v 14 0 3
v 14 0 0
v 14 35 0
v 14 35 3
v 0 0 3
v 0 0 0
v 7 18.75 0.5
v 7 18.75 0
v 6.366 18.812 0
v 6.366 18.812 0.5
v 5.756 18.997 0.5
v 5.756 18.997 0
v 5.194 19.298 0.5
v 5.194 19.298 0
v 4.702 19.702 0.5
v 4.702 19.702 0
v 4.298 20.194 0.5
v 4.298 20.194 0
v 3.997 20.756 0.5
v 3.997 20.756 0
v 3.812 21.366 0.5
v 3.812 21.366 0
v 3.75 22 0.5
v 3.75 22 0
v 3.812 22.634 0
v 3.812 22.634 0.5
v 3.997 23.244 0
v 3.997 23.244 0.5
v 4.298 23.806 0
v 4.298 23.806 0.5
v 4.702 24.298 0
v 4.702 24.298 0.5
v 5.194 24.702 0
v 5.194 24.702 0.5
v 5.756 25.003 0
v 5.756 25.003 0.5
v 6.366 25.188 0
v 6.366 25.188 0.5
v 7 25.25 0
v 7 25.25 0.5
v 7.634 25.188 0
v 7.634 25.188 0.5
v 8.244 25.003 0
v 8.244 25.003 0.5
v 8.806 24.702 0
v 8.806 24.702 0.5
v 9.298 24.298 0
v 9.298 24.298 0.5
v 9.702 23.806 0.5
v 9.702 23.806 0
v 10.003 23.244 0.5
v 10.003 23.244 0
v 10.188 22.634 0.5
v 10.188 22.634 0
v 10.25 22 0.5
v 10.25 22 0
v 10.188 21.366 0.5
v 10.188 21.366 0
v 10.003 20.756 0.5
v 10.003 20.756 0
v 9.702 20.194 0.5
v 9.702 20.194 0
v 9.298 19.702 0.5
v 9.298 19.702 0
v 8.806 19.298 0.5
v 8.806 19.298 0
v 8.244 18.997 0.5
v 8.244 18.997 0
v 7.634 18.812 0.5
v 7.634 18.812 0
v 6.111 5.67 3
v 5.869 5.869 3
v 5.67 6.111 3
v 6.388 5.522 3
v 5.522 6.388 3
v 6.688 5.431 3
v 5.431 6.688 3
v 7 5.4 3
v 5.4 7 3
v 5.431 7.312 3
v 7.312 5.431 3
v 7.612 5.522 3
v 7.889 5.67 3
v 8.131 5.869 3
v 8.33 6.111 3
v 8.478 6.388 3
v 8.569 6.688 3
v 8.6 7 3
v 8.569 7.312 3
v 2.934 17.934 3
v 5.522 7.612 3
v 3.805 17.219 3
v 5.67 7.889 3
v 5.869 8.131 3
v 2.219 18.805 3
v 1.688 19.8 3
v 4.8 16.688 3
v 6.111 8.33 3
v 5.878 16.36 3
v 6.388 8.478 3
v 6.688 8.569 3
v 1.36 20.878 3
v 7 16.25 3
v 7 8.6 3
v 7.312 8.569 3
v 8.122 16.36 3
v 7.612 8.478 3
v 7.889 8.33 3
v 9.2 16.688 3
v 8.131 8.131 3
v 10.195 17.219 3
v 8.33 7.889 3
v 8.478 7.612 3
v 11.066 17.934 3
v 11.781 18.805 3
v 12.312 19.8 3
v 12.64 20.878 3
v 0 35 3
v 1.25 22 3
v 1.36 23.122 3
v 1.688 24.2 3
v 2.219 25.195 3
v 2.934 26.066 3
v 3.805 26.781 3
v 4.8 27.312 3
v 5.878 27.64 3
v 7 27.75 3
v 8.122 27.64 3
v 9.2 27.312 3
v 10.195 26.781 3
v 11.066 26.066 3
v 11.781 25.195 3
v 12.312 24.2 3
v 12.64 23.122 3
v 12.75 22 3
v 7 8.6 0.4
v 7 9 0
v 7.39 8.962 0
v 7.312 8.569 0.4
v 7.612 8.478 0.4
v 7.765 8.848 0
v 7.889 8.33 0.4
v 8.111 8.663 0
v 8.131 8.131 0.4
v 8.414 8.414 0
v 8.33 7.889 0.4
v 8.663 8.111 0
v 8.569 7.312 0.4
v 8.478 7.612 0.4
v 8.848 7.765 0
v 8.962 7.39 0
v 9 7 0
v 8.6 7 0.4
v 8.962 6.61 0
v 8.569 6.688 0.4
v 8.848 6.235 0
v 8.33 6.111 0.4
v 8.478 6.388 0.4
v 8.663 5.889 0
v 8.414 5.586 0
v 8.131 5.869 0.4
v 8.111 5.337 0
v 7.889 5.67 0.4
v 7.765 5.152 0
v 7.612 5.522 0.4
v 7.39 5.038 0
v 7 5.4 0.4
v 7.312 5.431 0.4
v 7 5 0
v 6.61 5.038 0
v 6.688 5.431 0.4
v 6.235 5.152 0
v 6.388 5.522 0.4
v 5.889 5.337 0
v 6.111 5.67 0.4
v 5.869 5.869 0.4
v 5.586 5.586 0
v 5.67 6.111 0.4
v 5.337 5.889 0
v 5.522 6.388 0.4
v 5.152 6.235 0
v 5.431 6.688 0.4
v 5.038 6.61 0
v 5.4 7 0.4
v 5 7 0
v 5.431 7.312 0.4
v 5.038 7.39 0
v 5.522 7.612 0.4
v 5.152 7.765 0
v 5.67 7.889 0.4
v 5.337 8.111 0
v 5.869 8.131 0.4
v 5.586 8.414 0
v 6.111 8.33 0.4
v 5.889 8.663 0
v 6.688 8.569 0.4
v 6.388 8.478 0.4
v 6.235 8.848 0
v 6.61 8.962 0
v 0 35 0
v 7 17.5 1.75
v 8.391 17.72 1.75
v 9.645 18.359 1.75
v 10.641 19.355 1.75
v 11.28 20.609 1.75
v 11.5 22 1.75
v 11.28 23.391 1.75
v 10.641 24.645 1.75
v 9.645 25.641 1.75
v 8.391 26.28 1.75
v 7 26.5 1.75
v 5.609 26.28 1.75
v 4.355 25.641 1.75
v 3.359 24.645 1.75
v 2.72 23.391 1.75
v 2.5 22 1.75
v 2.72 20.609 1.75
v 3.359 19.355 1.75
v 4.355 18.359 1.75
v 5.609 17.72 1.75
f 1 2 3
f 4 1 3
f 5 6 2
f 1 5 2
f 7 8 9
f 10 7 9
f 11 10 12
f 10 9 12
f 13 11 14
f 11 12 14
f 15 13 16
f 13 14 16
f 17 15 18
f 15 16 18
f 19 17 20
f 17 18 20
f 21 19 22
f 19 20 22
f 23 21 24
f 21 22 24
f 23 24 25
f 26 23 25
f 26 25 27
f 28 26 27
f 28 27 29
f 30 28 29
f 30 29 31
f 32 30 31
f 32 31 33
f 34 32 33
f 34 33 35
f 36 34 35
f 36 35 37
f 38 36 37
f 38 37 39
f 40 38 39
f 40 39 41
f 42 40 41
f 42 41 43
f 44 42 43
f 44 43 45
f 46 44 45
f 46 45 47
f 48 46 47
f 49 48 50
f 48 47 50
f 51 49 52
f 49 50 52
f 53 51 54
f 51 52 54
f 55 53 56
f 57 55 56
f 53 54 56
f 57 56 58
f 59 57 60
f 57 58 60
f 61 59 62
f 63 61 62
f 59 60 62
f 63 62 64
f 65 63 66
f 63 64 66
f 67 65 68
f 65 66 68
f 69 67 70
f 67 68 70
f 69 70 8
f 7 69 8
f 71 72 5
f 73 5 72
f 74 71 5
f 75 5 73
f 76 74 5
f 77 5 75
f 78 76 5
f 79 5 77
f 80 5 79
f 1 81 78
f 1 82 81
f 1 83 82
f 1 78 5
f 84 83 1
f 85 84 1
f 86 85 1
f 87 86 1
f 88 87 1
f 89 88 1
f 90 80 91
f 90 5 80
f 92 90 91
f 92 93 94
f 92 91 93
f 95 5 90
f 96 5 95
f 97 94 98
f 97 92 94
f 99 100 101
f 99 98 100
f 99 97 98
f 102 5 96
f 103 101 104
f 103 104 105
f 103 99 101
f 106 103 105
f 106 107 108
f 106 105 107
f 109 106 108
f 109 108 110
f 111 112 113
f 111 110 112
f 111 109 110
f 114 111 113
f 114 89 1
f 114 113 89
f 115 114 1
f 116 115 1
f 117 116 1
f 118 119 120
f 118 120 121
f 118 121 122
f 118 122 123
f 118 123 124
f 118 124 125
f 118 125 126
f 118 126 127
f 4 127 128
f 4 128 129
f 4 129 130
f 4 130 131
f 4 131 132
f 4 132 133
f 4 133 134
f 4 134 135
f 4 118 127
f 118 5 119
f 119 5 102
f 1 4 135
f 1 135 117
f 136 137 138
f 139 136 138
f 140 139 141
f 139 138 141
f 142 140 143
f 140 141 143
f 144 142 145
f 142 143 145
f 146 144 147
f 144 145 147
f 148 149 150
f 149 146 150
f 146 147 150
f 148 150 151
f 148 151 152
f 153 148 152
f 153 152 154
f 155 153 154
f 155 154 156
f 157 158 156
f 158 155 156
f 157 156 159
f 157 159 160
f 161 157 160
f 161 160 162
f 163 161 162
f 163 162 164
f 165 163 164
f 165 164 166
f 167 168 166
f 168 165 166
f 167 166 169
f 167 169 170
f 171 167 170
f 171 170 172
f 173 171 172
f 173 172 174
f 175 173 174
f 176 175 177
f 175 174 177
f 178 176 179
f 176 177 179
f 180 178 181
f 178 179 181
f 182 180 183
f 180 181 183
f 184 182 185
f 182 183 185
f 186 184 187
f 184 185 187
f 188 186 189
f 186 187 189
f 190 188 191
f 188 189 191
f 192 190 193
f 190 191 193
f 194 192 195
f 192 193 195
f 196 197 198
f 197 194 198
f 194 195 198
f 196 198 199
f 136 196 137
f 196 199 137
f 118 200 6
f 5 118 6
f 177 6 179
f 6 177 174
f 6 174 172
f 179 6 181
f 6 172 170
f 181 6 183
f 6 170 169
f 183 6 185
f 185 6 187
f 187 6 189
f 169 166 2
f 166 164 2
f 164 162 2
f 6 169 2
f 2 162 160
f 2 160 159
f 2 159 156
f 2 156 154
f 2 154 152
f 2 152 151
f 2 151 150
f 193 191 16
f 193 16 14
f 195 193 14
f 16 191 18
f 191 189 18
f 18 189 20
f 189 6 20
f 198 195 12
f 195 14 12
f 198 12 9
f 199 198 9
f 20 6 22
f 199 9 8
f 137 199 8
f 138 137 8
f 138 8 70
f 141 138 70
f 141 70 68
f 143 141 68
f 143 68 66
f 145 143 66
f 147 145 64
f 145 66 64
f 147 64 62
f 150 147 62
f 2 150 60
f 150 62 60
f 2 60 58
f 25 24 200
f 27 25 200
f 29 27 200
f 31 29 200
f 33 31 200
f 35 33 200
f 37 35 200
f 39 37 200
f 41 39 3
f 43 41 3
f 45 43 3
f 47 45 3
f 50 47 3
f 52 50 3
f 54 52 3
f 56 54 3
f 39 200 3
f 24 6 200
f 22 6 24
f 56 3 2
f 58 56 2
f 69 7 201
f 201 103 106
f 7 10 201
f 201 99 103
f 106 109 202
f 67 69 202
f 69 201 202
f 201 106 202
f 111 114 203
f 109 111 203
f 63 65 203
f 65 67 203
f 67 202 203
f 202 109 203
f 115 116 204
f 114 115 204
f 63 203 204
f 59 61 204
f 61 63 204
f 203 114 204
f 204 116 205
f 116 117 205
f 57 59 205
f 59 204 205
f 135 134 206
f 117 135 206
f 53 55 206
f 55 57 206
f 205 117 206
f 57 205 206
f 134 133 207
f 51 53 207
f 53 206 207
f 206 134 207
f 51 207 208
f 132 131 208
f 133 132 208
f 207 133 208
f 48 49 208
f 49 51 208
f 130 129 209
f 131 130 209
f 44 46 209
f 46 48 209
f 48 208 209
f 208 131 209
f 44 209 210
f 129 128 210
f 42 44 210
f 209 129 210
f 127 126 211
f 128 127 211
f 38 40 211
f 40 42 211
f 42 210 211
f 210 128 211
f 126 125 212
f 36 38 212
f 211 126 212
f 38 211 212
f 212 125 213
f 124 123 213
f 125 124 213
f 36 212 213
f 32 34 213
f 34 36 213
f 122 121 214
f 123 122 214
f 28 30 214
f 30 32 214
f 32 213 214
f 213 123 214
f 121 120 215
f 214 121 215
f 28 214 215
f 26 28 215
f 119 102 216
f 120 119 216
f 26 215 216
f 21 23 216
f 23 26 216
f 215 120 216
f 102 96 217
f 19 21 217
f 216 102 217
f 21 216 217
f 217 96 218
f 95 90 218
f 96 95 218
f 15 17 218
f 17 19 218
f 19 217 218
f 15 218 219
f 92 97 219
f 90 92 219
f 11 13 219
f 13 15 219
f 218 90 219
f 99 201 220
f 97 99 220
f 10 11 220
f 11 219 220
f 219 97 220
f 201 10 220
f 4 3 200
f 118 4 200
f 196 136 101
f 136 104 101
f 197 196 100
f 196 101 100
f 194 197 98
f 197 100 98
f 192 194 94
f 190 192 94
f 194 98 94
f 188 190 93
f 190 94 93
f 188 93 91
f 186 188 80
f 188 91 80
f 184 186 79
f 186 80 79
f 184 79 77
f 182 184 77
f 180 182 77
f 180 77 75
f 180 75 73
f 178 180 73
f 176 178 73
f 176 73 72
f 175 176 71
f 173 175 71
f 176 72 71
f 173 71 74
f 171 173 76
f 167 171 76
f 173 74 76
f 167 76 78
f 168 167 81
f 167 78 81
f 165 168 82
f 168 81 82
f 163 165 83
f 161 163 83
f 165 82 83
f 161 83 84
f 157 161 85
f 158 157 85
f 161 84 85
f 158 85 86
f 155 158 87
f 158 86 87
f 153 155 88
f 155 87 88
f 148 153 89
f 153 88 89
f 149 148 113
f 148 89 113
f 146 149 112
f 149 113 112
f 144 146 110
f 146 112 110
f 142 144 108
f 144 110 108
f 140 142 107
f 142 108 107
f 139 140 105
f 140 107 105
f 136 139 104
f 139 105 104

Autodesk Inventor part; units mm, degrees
ref_plane "YZ Plane" through (0, 0, 0) normal (1, 0, 0) x (0, 1, 0)
ref_plane "XZ Plane" through (0, 0, 0) normal (0, 1, 0) x (-1, 0, 0)
ref_plane "XY Plane" through (0, 0, 0) normal (0, 0, 1) x (1, 0, 0)
sketch "Sketch1" plane through (0, 0, 0) normal (0, 0, 1) x (1, 0, 0)
  line L0 (0, 0) -> (14, 0)
  line L1 (14, 0) -> (14, 35)
  line L2 (14, 35) -> (0, 35)
  line L3 (0, 35) -> (0, 0)
  dimension "d0" = 14
  dimension "d1" = 35
extrude "Extrusion1" add sketch "Sketch1" along normal blind 3
sketch "Sketch2" plane through (0, 0, 3) normal (0, 0, 1) x (1, 0, 0)
  line L0 (0, 0) -> (0, 35) projected
  line L1 (0, 35) -> (14, 35) projected
  point P0 (7, 22)
  dimension "d4" = 13
  dimension "d5" = 7
hole "Hole1" at (7, 22, 3) direction (0, 0, -1) diameter 6.5 depth 3 tip angle 118 countersink diameter 11.5 countersink angle 90
sketch "Sketch3" plane through (0, 0, 0) normal (0, 0, -1) x (-1, 0, 0)
  line L0 (0, 0) -> (-14, 0) projected
  line L1 (0, 35) -> (0, 0) projected
  point P0 (-7, 7)
  dimension "d13" = 7
  dimension "d14" = 7
hole "Hole2" at (7, 7, 0) direction (0, 0, 1) diameter 3.2 depth 3 tip angle 118 countersink diameter 4 countersink angle 90
properties part number "SUPORTE(44)" material "Carbon Steel"
